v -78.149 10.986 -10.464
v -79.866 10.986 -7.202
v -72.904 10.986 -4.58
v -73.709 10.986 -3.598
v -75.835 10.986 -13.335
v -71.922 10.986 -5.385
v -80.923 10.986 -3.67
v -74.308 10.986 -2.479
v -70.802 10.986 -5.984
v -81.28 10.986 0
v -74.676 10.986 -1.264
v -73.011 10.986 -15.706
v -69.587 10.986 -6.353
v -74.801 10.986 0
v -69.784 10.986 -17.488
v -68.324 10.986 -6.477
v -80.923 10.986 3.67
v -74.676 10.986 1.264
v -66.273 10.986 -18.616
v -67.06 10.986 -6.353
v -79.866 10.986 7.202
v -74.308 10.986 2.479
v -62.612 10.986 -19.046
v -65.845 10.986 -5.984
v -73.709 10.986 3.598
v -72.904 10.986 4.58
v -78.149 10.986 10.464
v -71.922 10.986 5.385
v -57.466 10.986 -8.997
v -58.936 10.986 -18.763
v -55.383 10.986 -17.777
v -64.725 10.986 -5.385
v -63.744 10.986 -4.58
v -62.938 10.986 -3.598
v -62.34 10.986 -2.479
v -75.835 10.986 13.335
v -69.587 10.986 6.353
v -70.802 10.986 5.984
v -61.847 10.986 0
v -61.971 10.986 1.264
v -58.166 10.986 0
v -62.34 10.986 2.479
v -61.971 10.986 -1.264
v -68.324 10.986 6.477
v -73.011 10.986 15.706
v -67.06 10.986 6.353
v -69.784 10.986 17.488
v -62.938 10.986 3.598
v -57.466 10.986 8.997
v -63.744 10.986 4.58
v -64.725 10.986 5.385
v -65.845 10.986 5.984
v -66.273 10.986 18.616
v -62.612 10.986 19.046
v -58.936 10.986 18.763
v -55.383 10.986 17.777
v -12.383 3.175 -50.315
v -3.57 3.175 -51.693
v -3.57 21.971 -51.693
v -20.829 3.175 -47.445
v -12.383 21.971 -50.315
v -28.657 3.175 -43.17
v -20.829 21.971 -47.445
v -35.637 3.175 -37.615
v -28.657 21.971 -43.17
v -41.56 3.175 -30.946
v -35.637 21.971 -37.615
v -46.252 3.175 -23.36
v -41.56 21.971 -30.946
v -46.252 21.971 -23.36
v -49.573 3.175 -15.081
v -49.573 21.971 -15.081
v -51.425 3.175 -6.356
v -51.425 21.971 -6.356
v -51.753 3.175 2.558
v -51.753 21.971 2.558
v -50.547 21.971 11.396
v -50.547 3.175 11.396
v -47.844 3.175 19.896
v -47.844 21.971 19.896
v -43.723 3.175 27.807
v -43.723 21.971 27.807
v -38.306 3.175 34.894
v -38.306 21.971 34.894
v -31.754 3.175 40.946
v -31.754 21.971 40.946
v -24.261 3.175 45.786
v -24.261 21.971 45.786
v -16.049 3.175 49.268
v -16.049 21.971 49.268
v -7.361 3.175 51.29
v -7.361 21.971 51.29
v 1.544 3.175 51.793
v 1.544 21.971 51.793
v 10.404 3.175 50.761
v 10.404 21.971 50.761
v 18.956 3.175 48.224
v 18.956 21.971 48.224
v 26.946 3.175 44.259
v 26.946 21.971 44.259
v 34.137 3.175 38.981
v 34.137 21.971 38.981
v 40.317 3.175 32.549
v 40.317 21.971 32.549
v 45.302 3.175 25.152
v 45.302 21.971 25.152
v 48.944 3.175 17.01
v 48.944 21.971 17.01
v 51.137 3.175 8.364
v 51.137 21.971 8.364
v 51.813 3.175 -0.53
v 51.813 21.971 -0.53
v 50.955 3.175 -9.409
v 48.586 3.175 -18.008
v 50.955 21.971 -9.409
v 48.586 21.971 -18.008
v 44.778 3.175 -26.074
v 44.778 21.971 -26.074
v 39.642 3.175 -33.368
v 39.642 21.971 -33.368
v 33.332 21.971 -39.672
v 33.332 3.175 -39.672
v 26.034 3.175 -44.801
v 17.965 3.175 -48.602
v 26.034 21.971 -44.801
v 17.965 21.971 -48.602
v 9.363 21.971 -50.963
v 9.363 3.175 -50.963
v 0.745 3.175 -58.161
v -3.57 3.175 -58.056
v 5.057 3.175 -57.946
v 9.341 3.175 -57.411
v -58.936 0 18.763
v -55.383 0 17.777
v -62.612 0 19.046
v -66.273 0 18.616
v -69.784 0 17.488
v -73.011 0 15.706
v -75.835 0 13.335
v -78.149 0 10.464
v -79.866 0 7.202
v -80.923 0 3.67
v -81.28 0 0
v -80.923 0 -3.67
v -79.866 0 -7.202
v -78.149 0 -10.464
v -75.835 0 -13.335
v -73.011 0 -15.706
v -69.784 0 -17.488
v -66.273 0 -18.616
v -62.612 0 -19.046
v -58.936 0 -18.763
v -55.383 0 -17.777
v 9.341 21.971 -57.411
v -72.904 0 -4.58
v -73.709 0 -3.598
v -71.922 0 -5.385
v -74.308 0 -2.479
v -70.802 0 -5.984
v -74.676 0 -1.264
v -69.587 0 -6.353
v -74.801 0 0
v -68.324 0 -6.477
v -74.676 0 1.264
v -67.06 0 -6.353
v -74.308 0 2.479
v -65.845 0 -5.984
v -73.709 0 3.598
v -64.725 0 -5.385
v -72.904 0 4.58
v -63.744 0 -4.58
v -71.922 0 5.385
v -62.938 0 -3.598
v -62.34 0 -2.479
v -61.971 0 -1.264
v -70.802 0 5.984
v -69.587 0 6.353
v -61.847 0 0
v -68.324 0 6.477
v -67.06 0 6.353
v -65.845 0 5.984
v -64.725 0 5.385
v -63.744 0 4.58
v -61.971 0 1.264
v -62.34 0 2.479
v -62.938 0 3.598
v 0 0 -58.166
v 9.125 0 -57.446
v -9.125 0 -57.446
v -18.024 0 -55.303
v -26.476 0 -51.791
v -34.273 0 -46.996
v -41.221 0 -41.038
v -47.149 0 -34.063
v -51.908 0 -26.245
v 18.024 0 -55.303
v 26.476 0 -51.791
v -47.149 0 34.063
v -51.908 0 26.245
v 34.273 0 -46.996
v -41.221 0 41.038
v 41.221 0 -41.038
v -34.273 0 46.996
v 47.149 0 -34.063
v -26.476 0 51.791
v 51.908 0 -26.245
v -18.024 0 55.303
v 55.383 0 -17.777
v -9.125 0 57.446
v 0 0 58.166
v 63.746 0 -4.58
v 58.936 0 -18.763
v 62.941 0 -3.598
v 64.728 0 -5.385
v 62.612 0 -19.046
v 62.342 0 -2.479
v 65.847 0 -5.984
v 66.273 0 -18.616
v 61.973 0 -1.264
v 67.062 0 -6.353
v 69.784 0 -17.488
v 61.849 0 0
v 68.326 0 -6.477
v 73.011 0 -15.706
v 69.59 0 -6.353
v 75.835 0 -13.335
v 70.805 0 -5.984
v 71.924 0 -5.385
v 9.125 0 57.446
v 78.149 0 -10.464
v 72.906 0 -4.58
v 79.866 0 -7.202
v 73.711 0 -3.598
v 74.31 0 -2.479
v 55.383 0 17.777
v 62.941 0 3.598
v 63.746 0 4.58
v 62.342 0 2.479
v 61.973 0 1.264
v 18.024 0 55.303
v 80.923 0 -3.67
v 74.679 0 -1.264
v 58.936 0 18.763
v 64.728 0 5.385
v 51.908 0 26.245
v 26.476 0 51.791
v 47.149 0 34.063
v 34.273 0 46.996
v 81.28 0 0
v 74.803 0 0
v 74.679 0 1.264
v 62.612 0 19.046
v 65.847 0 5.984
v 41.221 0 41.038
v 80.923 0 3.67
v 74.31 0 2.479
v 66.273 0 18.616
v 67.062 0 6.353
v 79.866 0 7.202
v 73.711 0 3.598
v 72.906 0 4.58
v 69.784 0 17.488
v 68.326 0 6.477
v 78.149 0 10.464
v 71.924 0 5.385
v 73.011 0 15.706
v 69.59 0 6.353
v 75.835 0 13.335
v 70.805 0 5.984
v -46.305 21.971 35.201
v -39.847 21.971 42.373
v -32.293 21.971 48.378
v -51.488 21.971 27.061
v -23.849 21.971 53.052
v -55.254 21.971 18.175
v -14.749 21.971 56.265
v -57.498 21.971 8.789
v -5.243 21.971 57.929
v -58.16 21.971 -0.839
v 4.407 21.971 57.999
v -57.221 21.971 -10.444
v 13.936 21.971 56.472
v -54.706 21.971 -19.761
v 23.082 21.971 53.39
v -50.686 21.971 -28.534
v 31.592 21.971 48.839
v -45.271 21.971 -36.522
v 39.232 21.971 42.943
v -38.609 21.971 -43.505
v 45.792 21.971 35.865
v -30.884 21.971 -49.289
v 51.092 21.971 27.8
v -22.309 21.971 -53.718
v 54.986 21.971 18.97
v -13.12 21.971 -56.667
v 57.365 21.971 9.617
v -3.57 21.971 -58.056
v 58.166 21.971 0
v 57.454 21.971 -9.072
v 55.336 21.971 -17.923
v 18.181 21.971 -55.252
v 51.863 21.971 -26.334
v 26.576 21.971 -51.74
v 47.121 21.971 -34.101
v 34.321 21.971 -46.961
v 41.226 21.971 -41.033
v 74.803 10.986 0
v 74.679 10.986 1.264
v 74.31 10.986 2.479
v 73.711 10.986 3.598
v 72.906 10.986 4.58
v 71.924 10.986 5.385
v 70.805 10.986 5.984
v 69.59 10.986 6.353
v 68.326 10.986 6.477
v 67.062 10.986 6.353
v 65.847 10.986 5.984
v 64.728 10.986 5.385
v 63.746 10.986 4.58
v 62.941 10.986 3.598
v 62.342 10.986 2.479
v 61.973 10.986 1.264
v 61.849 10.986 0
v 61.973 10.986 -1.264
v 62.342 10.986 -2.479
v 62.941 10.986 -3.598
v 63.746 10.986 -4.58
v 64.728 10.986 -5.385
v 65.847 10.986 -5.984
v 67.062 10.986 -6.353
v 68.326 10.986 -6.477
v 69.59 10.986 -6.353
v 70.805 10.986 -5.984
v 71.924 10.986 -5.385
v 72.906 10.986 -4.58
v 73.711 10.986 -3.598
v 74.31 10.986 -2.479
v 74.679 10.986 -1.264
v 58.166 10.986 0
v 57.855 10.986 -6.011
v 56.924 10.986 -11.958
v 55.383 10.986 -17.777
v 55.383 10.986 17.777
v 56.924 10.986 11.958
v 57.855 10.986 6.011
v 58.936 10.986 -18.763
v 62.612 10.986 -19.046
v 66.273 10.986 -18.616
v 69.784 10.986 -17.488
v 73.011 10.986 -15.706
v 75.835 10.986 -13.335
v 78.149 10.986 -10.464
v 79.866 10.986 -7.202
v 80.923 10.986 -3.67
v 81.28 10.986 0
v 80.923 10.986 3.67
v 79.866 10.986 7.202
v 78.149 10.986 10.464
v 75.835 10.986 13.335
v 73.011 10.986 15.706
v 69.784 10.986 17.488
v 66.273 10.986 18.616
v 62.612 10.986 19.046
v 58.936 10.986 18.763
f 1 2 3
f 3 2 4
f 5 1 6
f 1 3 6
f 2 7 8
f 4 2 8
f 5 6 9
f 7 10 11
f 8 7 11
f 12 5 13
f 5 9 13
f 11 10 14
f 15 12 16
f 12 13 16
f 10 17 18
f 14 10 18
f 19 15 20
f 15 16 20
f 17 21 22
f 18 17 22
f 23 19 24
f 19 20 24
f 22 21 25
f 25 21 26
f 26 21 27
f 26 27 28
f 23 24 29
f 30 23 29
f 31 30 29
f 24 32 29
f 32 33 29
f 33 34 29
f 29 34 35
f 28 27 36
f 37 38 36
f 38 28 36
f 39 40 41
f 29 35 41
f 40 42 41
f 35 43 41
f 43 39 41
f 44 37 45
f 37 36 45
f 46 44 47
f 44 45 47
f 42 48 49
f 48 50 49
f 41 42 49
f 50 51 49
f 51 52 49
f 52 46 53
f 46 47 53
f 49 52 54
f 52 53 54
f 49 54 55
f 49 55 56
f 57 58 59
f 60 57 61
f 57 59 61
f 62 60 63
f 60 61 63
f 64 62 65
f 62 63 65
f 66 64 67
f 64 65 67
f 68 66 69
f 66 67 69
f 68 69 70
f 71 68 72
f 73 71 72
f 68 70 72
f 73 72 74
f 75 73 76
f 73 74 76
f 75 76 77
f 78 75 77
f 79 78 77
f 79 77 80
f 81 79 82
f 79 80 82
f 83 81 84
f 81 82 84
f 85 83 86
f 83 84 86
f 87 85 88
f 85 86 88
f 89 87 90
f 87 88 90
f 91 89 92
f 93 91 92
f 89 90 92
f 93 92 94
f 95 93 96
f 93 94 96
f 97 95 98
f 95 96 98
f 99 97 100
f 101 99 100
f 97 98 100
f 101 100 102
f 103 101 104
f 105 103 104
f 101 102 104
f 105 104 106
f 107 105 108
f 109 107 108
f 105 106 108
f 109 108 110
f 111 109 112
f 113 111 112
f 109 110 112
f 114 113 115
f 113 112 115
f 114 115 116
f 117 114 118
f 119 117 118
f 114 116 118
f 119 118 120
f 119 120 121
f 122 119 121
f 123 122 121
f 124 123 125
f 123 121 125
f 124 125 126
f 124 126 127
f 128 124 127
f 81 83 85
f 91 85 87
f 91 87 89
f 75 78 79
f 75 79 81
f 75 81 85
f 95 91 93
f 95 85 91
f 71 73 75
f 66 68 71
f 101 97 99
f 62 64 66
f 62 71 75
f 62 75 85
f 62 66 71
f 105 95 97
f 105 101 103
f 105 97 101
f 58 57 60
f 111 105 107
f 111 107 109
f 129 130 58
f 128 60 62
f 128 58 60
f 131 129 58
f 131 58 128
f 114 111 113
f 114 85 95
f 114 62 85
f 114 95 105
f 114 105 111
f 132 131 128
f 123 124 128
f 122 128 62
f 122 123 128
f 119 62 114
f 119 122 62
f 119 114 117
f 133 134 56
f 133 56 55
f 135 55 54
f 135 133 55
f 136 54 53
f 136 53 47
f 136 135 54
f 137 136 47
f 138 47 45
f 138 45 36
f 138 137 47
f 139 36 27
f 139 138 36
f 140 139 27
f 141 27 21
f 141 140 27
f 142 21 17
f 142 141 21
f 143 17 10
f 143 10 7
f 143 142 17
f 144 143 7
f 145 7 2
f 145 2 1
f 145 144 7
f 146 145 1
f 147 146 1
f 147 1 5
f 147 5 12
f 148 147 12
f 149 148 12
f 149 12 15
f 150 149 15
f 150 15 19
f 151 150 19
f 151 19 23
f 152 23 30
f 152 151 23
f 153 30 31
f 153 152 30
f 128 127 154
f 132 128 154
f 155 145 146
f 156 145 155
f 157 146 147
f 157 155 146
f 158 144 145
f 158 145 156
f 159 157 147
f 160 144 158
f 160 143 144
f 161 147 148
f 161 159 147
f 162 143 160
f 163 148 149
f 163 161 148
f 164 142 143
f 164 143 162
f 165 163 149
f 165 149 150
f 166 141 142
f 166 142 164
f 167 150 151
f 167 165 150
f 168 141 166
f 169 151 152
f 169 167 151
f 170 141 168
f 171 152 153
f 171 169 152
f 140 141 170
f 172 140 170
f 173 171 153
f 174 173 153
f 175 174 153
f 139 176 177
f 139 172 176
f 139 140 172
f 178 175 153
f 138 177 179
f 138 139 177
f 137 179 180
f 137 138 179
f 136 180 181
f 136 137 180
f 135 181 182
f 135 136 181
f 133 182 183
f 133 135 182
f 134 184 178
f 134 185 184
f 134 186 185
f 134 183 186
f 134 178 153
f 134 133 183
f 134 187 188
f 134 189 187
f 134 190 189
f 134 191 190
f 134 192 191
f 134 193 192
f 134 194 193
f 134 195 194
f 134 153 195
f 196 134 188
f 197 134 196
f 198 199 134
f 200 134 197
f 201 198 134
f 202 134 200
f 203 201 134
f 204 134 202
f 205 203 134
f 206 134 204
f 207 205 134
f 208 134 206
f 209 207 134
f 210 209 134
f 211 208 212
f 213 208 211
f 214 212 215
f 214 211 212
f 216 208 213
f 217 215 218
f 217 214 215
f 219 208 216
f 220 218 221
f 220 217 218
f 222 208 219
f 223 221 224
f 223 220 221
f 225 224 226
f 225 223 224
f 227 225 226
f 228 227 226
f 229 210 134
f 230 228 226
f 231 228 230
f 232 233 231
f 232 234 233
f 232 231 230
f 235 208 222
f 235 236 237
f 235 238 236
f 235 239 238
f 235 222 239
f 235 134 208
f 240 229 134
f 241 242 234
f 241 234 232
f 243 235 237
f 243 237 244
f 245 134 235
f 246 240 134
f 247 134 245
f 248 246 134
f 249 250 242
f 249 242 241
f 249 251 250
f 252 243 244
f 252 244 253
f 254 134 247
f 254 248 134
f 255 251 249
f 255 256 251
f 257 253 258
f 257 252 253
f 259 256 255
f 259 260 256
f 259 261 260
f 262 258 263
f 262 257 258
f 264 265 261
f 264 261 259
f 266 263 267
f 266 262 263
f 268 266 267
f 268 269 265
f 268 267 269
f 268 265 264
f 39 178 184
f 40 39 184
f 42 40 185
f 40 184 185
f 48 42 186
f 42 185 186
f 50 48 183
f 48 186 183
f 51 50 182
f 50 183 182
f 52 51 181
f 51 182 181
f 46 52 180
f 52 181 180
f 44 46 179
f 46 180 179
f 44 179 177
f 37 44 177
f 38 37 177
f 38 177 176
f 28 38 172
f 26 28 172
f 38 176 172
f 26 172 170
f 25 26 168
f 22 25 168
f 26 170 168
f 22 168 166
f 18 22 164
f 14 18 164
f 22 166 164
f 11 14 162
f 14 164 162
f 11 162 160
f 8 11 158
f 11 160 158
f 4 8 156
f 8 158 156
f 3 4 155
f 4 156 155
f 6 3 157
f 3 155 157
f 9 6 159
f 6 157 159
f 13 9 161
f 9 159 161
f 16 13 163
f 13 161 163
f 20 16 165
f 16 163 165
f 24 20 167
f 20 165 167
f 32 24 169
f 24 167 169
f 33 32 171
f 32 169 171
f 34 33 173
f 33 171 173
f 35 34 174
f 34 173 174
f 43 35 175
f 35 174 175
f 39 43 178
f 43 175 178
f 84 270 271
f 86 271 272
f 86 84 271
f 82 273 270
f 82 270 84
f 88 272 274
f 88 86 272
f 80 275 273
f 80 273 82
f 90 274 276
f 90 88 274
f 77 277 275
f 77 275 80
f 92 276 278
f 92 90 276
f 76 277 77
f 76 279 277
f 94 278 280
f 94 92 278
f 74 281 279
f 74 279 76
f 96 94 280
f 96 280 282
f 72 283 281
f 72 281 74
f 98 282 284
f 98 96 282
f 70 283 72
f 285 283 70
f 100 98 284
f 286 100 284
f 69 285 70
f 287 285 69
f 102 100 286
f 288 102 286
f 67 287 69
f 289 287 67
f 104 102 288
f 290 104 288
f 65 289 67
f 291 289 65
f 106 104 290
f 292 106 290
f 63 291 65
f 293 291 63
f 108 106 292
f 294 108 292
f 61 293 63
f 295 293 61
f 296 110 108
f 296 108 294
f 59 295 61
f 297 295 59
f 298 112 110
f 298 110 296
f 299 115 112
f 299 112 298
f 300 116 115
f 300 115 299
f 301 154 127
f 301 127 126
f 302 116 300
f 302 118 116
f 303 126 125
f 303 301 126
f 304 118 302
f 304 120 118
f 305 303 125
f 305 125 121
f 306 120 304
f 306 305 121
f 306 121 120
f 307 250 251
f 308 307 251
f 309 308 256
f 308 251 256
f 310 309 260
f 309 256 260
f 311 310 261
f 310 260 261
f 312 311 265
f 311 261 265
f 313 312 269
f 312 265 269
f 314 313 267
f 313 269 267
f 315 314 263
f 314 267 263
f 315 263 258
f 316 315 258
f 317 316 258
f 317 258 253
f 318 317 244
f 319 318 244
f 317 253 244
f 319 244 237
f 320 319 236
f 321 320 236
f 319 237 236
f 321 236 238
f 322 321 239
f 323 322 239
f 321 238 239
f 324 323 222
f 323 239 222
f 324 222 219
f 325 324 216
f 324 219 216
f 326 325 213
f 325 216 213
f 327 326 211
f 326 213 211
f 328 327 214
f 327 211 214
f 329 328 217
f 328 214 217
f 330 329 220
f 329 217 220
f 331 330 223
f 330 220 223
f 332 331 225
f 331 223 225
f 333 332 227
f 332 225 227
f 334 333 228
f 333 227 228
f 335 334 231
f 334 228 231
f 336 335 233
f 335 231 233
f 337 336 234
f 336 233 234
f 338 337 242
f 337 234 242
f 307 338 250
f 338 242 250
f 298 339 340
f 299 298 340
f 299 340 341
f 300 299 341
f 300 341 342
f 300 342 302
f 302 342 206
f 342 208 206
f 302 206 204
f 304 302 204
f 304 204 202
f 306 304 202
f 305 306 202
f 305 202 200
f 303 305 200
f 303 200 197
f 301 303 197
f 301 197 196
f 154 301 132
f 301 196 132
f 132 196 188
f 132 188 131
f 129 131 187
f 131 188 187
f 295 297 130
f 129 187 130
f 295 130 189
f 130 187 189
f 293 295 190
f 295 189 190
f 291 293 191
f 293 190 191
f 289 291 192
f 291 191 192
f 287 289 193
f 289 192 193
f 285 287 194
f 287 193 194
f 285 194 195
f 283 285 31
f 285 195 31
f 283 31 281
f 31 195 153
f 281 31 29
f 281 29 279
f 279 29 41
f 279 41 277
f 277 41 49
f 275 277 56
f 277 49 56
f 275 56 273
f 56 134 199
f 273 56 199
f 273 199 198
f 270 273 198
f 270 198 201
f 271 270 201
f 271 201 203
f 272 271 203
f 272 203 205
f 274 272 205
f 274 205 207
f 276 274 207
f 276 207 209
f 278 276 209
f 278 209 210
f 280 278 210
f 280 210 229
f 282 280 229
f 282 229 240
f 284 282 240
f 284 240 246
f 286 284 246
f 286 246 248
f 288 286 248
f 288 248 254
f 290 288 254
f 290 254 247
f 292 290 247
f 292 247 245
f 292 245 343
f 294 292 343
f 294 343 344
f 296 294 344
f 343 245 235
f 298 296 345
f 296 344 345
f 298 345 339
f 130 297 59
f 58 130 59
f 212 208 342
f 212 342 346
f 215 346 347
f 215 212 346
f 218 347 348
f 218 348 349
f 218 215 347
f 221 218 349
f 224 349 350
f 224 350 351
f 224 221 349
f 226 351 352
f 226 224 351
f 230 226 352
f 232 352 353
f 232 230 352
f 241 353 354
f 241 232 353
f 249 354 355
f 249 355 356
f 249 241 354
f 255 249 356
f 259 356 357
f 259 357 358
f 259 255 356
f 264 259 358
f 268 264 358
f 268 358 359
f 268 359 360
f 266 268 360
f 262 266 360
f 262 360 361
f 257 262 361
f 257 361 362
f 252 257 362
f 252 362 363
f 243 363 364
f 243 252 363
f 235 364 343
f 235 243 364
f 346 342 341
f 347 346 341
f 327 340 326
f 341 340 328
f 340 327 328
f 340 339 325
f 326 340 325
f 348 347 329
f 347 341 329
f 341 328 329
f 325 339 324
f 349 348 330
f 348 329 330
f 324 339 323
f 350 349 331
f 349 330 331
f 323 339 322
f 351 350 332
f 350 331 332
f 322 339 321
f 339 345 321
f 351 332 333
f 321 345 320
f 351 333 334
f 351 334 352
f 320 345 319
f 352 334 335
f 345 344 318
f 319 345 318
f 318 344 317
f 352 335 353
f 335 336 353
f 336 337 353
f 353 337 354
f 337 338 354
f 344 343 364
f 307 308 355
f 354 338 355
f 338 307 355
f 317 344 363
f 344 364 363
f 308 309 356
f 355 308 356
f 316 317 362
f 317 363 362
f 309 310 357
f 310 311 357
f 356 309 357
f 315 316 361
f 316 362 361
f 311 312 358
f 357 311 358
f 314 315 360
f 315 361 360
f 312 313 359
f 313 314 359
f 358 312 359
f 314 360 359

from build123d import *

# Parameters (mm, degrees)
SKETCH1_R           = 58.166
BOSS_EXTRUDE1_DEPTH = 21.971
SKETCH3_R           = 51.816
CUT_EXTRUDE2_DEPTH  = 18.796
CUT_EXTRUDE7_DEPTH  = 18.796
SKETCH7_R           = 6.477
BOSS_EXTRUDE3_DEPTH = 10.9855


with BuildPart() as part:
    # Sketch1 → Boss-Extrude1 (new body)
    with BuildSketch(Plane(origin=(0, 0, 0), x_dir=(1, 0, 0), z_dir=(0, 1, 0))):
        Circle(SKETCH1_R)
    extrude(amount=BOSS_EXTRUDE1_DEPTH)

    # Sketch3 → Cut-Extrude2 (cut)
    with BuildSketch(Plane(origin=(0, 21.971, 0), x_dir=(1, 0, 0), z_dir=(0, 1, 0))):
        Circle(SKETCH3_R)
    extrude(amount=-CUT_EXTRUDE2_DEPTH, mode=Mode.SUBTRACT)

    # Sketch6 → Cut-Extrude7 (cut)
    with BuildSketch(Plane(origin=(0, 21.971, 0), x_dir=(1, 0, 0), z_dir=(0, 1, 0))):
        with BuildLine():
            Line((9.363048829, 50.963037318), (9.340756891, 57.411094892))
            ThreePointArc((9.340756891, 57.411094892), (2.903170649, 58.093503563), (-3.57037671, 58.056317194))
            Line((-3.57037671, 58.056317194), (-3.57037671, 51.692845406))
            ThreePointArc((-3.57037671, 51.692845406), (2.919232353, 51.733702153), (9.363048829, 50.963037318))
        make_face()
    extrude(amount=-CUT_EXTRUDE7_DEPTH, mode=Mode.SUBTRACT)

    # Sketch7 → Boss-Extrude3 (add)
    with BuildSketch(Plane.XZ):
        with BuildLine():
            ThreePointArc((55.382885714, -17.776938037), (81.28, 0), (55.382885714, 17.776938037))
            ThreePointArc((55.382885714, 17.776938037), (58.166, 0), (55.382885714, -17.776938037))
        make_face()
        with Locations((68.326, 0)):
            Circle(SKETCH7_R, mode=Mode.SUBTRACT)
        with BuildLine():
            ThreePointArc((-55.382885714, 17.776938037), (-81.28, 0), (-55.382885714, -17.776938037))
            ThreePointArc((-55.382885714, -17.776938037), (-58.166, 0), (-55.382885714, 17.776938037))
        make_face()
        with Locations((-68.323824172, 0)):
            Circle(SKETCH7_R, mode=Mode.SUBTRACT)
    extrude(amount=-BOSS_EXTRUDE3_DEPTH)


solid = part.part
